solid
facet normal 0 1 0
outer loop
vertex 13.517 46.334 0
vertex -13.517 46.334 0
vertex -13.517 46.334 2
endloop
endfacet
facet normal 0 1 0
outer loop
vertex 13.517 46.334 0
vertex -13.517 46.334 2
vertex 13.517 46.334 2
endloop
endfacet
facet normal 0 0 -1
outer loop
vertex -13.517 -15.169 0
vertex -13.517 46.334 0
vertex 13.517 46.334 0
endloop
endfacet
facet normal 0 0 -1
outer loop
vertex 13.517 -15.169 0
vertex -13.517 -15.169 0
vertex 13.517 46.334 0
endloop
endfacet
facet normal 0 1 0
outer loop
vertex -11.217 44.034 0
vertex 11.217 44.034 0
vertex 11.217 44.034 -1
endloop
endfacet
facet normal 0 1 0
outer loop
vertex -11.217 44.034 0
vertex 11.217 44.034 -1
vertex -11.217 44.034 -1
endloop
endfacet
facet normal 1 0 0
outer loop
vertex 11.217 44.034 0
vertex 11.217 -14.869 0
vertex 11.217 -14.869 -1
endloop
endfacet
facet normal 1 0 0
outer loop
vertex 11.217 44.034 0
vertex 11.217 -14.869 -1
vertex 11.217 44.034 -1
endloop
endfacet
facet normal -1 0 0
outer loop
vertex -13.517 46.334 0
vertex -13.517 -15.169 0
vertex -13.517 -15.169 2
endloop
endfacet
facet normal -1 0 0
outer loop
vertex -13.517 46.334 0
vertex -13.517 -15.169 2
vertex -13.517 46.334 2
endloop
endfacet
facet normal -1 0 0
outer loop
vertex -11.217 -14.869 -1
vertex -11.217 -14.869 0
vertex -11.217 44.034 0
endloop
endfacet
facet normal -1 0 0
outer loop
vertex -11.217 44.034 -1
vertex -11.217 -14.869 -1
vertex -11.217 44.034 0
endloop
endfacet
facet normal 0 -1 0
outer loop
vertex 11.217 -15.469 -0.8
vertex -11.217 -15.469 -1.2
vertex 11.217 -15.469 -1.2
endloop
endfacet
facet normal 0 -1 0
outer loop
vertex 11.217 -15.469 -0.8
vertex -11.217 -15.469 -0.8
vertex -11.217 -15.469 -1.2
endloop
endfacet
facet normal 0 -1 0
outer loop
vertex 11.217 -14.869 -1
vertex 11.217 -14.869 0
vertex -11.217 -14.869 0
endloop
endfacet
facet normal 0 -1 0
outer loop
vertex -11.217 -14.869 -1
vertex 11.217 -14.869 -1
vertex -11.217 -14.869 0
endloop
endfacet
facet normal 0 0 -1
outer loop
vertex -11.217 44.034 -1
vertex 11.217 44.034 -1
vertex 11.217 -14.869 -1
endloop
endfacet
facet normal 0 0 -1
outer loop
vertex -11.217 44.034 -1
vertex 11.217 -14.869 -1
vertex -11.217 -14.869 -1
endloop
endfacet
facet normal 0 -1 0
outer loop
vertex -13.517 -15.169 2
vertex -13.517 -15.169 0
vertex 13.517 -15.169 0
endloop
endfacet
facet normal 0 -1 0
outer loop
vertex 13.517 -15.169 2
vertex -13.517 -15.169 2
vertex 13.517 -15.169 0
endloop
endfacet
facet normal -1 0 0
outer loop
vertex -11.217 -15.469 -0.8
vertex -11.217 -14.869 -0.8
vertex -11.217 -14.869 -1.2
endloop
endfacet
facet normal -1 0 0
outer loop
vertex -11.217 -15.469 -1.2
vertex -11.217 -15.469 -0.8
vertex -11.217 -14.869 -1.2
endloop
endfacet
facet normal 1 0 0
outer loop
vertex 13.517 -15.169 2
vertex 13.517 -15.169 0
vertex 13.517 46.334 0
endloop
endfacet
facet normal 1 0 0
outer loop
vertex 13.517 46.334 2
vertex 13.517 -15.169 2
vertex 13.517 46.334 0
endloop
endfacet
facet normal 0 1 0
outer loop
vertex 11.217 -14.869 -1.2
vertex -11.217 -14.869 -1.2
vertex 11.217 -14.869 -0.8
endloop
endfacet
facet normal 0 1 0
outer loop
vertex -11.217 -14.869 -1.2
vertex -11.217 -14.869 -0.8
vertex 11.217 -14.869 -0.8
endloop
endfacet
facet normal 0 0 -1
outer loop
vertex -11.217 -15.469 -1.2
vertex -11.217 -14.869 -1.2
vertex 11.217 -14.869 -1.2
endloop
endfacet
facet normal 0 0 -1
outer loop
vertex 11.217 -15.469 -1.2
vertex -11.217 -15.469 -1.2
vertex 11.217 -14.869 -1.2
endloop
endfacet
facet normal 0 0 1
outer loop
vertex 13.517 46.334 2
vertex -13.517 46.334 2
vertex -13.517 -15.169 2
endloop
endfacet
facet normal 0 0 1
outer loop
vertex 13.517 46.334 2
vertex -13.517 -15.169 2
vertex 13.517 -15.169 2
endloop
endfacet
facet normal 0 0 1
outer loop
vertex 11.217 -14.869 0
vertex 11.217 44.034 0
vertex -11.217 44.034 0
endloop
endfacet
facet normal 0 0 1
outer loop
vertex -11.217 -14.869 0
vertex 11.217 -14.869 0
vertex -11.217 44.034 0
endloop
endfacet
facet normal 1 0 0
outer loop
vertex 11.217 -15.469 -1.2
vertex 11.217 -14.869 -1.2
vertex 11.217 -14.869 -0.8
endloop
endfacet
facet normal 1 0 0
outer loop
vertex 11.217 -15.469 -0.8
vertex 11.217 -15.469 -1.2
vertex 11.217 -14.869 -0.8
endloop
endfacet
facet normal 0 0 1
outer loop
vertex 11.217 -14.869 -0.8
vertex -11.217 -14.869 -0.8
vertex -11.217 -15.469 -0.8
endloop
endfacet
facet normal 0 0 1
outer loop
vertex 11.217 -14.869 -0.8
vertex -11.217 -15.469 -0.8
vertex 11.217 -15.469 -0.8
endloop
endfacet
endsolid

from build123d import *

# Parameters (mm, degrees)
SKETCH1_W           = 27.034600944
SKETCH1_H           = 61.50289226
BOSS_EXTRUDE1_DEPTH = 2
SKETCH2_W           = 22.434600944
SKETCH2_H           = 58.90289226
BOSS_EXTRUDE2_DEPTH = 1
SKETCH3_W           = 22.434600944
SKETCH3_H           = 0.2
BOSS_EXTRUDE3_DEPTH = 0.6


with BuildPart() as part:
    # Sketch1 → Boss-Extrude1 (new body)
    with BuildSketch(Plane.XY):
        with Locations((0, 15.582400554)):
            Rectangle(SKETCH1_W, SKETCH1_H)
    extrude(amount=BOSS_EXTRUDE1_DEPTH)


with BuildPart() as body_2:
    # Sketch2 → Boss-Extrude2 (new body)
    with BuildSketch(Plane(origin=(0, 0, 0), x_dir=(-1, 0, 0), z_dir=(0, 0, -1))):
        with Locations((0, 14.582400554)):
            Rectangle(SKETCH2_W, SKETCH2_H)
    extrude(amount=BOSS_EXTRUDE2_DEPTH)


with BuildPart() as body_3:
    # Sketch3 → Boss-Extrude3 (new body)
    with BuildSketch(Plane.XZ.offset(14.869045576)):
        with Locations((0, -1.1)):
            Rectangle(SKETCH3_W, SKETCH3_H)
        with Locations((0, -0.9)):
            Rectangle(SKETCH3_W, SKETCH3_H)
    extrude(amount=BOSS_EXTRUDE3_DEPTH)


solid = Compound([part.part, body_2.part, body_3.part])
